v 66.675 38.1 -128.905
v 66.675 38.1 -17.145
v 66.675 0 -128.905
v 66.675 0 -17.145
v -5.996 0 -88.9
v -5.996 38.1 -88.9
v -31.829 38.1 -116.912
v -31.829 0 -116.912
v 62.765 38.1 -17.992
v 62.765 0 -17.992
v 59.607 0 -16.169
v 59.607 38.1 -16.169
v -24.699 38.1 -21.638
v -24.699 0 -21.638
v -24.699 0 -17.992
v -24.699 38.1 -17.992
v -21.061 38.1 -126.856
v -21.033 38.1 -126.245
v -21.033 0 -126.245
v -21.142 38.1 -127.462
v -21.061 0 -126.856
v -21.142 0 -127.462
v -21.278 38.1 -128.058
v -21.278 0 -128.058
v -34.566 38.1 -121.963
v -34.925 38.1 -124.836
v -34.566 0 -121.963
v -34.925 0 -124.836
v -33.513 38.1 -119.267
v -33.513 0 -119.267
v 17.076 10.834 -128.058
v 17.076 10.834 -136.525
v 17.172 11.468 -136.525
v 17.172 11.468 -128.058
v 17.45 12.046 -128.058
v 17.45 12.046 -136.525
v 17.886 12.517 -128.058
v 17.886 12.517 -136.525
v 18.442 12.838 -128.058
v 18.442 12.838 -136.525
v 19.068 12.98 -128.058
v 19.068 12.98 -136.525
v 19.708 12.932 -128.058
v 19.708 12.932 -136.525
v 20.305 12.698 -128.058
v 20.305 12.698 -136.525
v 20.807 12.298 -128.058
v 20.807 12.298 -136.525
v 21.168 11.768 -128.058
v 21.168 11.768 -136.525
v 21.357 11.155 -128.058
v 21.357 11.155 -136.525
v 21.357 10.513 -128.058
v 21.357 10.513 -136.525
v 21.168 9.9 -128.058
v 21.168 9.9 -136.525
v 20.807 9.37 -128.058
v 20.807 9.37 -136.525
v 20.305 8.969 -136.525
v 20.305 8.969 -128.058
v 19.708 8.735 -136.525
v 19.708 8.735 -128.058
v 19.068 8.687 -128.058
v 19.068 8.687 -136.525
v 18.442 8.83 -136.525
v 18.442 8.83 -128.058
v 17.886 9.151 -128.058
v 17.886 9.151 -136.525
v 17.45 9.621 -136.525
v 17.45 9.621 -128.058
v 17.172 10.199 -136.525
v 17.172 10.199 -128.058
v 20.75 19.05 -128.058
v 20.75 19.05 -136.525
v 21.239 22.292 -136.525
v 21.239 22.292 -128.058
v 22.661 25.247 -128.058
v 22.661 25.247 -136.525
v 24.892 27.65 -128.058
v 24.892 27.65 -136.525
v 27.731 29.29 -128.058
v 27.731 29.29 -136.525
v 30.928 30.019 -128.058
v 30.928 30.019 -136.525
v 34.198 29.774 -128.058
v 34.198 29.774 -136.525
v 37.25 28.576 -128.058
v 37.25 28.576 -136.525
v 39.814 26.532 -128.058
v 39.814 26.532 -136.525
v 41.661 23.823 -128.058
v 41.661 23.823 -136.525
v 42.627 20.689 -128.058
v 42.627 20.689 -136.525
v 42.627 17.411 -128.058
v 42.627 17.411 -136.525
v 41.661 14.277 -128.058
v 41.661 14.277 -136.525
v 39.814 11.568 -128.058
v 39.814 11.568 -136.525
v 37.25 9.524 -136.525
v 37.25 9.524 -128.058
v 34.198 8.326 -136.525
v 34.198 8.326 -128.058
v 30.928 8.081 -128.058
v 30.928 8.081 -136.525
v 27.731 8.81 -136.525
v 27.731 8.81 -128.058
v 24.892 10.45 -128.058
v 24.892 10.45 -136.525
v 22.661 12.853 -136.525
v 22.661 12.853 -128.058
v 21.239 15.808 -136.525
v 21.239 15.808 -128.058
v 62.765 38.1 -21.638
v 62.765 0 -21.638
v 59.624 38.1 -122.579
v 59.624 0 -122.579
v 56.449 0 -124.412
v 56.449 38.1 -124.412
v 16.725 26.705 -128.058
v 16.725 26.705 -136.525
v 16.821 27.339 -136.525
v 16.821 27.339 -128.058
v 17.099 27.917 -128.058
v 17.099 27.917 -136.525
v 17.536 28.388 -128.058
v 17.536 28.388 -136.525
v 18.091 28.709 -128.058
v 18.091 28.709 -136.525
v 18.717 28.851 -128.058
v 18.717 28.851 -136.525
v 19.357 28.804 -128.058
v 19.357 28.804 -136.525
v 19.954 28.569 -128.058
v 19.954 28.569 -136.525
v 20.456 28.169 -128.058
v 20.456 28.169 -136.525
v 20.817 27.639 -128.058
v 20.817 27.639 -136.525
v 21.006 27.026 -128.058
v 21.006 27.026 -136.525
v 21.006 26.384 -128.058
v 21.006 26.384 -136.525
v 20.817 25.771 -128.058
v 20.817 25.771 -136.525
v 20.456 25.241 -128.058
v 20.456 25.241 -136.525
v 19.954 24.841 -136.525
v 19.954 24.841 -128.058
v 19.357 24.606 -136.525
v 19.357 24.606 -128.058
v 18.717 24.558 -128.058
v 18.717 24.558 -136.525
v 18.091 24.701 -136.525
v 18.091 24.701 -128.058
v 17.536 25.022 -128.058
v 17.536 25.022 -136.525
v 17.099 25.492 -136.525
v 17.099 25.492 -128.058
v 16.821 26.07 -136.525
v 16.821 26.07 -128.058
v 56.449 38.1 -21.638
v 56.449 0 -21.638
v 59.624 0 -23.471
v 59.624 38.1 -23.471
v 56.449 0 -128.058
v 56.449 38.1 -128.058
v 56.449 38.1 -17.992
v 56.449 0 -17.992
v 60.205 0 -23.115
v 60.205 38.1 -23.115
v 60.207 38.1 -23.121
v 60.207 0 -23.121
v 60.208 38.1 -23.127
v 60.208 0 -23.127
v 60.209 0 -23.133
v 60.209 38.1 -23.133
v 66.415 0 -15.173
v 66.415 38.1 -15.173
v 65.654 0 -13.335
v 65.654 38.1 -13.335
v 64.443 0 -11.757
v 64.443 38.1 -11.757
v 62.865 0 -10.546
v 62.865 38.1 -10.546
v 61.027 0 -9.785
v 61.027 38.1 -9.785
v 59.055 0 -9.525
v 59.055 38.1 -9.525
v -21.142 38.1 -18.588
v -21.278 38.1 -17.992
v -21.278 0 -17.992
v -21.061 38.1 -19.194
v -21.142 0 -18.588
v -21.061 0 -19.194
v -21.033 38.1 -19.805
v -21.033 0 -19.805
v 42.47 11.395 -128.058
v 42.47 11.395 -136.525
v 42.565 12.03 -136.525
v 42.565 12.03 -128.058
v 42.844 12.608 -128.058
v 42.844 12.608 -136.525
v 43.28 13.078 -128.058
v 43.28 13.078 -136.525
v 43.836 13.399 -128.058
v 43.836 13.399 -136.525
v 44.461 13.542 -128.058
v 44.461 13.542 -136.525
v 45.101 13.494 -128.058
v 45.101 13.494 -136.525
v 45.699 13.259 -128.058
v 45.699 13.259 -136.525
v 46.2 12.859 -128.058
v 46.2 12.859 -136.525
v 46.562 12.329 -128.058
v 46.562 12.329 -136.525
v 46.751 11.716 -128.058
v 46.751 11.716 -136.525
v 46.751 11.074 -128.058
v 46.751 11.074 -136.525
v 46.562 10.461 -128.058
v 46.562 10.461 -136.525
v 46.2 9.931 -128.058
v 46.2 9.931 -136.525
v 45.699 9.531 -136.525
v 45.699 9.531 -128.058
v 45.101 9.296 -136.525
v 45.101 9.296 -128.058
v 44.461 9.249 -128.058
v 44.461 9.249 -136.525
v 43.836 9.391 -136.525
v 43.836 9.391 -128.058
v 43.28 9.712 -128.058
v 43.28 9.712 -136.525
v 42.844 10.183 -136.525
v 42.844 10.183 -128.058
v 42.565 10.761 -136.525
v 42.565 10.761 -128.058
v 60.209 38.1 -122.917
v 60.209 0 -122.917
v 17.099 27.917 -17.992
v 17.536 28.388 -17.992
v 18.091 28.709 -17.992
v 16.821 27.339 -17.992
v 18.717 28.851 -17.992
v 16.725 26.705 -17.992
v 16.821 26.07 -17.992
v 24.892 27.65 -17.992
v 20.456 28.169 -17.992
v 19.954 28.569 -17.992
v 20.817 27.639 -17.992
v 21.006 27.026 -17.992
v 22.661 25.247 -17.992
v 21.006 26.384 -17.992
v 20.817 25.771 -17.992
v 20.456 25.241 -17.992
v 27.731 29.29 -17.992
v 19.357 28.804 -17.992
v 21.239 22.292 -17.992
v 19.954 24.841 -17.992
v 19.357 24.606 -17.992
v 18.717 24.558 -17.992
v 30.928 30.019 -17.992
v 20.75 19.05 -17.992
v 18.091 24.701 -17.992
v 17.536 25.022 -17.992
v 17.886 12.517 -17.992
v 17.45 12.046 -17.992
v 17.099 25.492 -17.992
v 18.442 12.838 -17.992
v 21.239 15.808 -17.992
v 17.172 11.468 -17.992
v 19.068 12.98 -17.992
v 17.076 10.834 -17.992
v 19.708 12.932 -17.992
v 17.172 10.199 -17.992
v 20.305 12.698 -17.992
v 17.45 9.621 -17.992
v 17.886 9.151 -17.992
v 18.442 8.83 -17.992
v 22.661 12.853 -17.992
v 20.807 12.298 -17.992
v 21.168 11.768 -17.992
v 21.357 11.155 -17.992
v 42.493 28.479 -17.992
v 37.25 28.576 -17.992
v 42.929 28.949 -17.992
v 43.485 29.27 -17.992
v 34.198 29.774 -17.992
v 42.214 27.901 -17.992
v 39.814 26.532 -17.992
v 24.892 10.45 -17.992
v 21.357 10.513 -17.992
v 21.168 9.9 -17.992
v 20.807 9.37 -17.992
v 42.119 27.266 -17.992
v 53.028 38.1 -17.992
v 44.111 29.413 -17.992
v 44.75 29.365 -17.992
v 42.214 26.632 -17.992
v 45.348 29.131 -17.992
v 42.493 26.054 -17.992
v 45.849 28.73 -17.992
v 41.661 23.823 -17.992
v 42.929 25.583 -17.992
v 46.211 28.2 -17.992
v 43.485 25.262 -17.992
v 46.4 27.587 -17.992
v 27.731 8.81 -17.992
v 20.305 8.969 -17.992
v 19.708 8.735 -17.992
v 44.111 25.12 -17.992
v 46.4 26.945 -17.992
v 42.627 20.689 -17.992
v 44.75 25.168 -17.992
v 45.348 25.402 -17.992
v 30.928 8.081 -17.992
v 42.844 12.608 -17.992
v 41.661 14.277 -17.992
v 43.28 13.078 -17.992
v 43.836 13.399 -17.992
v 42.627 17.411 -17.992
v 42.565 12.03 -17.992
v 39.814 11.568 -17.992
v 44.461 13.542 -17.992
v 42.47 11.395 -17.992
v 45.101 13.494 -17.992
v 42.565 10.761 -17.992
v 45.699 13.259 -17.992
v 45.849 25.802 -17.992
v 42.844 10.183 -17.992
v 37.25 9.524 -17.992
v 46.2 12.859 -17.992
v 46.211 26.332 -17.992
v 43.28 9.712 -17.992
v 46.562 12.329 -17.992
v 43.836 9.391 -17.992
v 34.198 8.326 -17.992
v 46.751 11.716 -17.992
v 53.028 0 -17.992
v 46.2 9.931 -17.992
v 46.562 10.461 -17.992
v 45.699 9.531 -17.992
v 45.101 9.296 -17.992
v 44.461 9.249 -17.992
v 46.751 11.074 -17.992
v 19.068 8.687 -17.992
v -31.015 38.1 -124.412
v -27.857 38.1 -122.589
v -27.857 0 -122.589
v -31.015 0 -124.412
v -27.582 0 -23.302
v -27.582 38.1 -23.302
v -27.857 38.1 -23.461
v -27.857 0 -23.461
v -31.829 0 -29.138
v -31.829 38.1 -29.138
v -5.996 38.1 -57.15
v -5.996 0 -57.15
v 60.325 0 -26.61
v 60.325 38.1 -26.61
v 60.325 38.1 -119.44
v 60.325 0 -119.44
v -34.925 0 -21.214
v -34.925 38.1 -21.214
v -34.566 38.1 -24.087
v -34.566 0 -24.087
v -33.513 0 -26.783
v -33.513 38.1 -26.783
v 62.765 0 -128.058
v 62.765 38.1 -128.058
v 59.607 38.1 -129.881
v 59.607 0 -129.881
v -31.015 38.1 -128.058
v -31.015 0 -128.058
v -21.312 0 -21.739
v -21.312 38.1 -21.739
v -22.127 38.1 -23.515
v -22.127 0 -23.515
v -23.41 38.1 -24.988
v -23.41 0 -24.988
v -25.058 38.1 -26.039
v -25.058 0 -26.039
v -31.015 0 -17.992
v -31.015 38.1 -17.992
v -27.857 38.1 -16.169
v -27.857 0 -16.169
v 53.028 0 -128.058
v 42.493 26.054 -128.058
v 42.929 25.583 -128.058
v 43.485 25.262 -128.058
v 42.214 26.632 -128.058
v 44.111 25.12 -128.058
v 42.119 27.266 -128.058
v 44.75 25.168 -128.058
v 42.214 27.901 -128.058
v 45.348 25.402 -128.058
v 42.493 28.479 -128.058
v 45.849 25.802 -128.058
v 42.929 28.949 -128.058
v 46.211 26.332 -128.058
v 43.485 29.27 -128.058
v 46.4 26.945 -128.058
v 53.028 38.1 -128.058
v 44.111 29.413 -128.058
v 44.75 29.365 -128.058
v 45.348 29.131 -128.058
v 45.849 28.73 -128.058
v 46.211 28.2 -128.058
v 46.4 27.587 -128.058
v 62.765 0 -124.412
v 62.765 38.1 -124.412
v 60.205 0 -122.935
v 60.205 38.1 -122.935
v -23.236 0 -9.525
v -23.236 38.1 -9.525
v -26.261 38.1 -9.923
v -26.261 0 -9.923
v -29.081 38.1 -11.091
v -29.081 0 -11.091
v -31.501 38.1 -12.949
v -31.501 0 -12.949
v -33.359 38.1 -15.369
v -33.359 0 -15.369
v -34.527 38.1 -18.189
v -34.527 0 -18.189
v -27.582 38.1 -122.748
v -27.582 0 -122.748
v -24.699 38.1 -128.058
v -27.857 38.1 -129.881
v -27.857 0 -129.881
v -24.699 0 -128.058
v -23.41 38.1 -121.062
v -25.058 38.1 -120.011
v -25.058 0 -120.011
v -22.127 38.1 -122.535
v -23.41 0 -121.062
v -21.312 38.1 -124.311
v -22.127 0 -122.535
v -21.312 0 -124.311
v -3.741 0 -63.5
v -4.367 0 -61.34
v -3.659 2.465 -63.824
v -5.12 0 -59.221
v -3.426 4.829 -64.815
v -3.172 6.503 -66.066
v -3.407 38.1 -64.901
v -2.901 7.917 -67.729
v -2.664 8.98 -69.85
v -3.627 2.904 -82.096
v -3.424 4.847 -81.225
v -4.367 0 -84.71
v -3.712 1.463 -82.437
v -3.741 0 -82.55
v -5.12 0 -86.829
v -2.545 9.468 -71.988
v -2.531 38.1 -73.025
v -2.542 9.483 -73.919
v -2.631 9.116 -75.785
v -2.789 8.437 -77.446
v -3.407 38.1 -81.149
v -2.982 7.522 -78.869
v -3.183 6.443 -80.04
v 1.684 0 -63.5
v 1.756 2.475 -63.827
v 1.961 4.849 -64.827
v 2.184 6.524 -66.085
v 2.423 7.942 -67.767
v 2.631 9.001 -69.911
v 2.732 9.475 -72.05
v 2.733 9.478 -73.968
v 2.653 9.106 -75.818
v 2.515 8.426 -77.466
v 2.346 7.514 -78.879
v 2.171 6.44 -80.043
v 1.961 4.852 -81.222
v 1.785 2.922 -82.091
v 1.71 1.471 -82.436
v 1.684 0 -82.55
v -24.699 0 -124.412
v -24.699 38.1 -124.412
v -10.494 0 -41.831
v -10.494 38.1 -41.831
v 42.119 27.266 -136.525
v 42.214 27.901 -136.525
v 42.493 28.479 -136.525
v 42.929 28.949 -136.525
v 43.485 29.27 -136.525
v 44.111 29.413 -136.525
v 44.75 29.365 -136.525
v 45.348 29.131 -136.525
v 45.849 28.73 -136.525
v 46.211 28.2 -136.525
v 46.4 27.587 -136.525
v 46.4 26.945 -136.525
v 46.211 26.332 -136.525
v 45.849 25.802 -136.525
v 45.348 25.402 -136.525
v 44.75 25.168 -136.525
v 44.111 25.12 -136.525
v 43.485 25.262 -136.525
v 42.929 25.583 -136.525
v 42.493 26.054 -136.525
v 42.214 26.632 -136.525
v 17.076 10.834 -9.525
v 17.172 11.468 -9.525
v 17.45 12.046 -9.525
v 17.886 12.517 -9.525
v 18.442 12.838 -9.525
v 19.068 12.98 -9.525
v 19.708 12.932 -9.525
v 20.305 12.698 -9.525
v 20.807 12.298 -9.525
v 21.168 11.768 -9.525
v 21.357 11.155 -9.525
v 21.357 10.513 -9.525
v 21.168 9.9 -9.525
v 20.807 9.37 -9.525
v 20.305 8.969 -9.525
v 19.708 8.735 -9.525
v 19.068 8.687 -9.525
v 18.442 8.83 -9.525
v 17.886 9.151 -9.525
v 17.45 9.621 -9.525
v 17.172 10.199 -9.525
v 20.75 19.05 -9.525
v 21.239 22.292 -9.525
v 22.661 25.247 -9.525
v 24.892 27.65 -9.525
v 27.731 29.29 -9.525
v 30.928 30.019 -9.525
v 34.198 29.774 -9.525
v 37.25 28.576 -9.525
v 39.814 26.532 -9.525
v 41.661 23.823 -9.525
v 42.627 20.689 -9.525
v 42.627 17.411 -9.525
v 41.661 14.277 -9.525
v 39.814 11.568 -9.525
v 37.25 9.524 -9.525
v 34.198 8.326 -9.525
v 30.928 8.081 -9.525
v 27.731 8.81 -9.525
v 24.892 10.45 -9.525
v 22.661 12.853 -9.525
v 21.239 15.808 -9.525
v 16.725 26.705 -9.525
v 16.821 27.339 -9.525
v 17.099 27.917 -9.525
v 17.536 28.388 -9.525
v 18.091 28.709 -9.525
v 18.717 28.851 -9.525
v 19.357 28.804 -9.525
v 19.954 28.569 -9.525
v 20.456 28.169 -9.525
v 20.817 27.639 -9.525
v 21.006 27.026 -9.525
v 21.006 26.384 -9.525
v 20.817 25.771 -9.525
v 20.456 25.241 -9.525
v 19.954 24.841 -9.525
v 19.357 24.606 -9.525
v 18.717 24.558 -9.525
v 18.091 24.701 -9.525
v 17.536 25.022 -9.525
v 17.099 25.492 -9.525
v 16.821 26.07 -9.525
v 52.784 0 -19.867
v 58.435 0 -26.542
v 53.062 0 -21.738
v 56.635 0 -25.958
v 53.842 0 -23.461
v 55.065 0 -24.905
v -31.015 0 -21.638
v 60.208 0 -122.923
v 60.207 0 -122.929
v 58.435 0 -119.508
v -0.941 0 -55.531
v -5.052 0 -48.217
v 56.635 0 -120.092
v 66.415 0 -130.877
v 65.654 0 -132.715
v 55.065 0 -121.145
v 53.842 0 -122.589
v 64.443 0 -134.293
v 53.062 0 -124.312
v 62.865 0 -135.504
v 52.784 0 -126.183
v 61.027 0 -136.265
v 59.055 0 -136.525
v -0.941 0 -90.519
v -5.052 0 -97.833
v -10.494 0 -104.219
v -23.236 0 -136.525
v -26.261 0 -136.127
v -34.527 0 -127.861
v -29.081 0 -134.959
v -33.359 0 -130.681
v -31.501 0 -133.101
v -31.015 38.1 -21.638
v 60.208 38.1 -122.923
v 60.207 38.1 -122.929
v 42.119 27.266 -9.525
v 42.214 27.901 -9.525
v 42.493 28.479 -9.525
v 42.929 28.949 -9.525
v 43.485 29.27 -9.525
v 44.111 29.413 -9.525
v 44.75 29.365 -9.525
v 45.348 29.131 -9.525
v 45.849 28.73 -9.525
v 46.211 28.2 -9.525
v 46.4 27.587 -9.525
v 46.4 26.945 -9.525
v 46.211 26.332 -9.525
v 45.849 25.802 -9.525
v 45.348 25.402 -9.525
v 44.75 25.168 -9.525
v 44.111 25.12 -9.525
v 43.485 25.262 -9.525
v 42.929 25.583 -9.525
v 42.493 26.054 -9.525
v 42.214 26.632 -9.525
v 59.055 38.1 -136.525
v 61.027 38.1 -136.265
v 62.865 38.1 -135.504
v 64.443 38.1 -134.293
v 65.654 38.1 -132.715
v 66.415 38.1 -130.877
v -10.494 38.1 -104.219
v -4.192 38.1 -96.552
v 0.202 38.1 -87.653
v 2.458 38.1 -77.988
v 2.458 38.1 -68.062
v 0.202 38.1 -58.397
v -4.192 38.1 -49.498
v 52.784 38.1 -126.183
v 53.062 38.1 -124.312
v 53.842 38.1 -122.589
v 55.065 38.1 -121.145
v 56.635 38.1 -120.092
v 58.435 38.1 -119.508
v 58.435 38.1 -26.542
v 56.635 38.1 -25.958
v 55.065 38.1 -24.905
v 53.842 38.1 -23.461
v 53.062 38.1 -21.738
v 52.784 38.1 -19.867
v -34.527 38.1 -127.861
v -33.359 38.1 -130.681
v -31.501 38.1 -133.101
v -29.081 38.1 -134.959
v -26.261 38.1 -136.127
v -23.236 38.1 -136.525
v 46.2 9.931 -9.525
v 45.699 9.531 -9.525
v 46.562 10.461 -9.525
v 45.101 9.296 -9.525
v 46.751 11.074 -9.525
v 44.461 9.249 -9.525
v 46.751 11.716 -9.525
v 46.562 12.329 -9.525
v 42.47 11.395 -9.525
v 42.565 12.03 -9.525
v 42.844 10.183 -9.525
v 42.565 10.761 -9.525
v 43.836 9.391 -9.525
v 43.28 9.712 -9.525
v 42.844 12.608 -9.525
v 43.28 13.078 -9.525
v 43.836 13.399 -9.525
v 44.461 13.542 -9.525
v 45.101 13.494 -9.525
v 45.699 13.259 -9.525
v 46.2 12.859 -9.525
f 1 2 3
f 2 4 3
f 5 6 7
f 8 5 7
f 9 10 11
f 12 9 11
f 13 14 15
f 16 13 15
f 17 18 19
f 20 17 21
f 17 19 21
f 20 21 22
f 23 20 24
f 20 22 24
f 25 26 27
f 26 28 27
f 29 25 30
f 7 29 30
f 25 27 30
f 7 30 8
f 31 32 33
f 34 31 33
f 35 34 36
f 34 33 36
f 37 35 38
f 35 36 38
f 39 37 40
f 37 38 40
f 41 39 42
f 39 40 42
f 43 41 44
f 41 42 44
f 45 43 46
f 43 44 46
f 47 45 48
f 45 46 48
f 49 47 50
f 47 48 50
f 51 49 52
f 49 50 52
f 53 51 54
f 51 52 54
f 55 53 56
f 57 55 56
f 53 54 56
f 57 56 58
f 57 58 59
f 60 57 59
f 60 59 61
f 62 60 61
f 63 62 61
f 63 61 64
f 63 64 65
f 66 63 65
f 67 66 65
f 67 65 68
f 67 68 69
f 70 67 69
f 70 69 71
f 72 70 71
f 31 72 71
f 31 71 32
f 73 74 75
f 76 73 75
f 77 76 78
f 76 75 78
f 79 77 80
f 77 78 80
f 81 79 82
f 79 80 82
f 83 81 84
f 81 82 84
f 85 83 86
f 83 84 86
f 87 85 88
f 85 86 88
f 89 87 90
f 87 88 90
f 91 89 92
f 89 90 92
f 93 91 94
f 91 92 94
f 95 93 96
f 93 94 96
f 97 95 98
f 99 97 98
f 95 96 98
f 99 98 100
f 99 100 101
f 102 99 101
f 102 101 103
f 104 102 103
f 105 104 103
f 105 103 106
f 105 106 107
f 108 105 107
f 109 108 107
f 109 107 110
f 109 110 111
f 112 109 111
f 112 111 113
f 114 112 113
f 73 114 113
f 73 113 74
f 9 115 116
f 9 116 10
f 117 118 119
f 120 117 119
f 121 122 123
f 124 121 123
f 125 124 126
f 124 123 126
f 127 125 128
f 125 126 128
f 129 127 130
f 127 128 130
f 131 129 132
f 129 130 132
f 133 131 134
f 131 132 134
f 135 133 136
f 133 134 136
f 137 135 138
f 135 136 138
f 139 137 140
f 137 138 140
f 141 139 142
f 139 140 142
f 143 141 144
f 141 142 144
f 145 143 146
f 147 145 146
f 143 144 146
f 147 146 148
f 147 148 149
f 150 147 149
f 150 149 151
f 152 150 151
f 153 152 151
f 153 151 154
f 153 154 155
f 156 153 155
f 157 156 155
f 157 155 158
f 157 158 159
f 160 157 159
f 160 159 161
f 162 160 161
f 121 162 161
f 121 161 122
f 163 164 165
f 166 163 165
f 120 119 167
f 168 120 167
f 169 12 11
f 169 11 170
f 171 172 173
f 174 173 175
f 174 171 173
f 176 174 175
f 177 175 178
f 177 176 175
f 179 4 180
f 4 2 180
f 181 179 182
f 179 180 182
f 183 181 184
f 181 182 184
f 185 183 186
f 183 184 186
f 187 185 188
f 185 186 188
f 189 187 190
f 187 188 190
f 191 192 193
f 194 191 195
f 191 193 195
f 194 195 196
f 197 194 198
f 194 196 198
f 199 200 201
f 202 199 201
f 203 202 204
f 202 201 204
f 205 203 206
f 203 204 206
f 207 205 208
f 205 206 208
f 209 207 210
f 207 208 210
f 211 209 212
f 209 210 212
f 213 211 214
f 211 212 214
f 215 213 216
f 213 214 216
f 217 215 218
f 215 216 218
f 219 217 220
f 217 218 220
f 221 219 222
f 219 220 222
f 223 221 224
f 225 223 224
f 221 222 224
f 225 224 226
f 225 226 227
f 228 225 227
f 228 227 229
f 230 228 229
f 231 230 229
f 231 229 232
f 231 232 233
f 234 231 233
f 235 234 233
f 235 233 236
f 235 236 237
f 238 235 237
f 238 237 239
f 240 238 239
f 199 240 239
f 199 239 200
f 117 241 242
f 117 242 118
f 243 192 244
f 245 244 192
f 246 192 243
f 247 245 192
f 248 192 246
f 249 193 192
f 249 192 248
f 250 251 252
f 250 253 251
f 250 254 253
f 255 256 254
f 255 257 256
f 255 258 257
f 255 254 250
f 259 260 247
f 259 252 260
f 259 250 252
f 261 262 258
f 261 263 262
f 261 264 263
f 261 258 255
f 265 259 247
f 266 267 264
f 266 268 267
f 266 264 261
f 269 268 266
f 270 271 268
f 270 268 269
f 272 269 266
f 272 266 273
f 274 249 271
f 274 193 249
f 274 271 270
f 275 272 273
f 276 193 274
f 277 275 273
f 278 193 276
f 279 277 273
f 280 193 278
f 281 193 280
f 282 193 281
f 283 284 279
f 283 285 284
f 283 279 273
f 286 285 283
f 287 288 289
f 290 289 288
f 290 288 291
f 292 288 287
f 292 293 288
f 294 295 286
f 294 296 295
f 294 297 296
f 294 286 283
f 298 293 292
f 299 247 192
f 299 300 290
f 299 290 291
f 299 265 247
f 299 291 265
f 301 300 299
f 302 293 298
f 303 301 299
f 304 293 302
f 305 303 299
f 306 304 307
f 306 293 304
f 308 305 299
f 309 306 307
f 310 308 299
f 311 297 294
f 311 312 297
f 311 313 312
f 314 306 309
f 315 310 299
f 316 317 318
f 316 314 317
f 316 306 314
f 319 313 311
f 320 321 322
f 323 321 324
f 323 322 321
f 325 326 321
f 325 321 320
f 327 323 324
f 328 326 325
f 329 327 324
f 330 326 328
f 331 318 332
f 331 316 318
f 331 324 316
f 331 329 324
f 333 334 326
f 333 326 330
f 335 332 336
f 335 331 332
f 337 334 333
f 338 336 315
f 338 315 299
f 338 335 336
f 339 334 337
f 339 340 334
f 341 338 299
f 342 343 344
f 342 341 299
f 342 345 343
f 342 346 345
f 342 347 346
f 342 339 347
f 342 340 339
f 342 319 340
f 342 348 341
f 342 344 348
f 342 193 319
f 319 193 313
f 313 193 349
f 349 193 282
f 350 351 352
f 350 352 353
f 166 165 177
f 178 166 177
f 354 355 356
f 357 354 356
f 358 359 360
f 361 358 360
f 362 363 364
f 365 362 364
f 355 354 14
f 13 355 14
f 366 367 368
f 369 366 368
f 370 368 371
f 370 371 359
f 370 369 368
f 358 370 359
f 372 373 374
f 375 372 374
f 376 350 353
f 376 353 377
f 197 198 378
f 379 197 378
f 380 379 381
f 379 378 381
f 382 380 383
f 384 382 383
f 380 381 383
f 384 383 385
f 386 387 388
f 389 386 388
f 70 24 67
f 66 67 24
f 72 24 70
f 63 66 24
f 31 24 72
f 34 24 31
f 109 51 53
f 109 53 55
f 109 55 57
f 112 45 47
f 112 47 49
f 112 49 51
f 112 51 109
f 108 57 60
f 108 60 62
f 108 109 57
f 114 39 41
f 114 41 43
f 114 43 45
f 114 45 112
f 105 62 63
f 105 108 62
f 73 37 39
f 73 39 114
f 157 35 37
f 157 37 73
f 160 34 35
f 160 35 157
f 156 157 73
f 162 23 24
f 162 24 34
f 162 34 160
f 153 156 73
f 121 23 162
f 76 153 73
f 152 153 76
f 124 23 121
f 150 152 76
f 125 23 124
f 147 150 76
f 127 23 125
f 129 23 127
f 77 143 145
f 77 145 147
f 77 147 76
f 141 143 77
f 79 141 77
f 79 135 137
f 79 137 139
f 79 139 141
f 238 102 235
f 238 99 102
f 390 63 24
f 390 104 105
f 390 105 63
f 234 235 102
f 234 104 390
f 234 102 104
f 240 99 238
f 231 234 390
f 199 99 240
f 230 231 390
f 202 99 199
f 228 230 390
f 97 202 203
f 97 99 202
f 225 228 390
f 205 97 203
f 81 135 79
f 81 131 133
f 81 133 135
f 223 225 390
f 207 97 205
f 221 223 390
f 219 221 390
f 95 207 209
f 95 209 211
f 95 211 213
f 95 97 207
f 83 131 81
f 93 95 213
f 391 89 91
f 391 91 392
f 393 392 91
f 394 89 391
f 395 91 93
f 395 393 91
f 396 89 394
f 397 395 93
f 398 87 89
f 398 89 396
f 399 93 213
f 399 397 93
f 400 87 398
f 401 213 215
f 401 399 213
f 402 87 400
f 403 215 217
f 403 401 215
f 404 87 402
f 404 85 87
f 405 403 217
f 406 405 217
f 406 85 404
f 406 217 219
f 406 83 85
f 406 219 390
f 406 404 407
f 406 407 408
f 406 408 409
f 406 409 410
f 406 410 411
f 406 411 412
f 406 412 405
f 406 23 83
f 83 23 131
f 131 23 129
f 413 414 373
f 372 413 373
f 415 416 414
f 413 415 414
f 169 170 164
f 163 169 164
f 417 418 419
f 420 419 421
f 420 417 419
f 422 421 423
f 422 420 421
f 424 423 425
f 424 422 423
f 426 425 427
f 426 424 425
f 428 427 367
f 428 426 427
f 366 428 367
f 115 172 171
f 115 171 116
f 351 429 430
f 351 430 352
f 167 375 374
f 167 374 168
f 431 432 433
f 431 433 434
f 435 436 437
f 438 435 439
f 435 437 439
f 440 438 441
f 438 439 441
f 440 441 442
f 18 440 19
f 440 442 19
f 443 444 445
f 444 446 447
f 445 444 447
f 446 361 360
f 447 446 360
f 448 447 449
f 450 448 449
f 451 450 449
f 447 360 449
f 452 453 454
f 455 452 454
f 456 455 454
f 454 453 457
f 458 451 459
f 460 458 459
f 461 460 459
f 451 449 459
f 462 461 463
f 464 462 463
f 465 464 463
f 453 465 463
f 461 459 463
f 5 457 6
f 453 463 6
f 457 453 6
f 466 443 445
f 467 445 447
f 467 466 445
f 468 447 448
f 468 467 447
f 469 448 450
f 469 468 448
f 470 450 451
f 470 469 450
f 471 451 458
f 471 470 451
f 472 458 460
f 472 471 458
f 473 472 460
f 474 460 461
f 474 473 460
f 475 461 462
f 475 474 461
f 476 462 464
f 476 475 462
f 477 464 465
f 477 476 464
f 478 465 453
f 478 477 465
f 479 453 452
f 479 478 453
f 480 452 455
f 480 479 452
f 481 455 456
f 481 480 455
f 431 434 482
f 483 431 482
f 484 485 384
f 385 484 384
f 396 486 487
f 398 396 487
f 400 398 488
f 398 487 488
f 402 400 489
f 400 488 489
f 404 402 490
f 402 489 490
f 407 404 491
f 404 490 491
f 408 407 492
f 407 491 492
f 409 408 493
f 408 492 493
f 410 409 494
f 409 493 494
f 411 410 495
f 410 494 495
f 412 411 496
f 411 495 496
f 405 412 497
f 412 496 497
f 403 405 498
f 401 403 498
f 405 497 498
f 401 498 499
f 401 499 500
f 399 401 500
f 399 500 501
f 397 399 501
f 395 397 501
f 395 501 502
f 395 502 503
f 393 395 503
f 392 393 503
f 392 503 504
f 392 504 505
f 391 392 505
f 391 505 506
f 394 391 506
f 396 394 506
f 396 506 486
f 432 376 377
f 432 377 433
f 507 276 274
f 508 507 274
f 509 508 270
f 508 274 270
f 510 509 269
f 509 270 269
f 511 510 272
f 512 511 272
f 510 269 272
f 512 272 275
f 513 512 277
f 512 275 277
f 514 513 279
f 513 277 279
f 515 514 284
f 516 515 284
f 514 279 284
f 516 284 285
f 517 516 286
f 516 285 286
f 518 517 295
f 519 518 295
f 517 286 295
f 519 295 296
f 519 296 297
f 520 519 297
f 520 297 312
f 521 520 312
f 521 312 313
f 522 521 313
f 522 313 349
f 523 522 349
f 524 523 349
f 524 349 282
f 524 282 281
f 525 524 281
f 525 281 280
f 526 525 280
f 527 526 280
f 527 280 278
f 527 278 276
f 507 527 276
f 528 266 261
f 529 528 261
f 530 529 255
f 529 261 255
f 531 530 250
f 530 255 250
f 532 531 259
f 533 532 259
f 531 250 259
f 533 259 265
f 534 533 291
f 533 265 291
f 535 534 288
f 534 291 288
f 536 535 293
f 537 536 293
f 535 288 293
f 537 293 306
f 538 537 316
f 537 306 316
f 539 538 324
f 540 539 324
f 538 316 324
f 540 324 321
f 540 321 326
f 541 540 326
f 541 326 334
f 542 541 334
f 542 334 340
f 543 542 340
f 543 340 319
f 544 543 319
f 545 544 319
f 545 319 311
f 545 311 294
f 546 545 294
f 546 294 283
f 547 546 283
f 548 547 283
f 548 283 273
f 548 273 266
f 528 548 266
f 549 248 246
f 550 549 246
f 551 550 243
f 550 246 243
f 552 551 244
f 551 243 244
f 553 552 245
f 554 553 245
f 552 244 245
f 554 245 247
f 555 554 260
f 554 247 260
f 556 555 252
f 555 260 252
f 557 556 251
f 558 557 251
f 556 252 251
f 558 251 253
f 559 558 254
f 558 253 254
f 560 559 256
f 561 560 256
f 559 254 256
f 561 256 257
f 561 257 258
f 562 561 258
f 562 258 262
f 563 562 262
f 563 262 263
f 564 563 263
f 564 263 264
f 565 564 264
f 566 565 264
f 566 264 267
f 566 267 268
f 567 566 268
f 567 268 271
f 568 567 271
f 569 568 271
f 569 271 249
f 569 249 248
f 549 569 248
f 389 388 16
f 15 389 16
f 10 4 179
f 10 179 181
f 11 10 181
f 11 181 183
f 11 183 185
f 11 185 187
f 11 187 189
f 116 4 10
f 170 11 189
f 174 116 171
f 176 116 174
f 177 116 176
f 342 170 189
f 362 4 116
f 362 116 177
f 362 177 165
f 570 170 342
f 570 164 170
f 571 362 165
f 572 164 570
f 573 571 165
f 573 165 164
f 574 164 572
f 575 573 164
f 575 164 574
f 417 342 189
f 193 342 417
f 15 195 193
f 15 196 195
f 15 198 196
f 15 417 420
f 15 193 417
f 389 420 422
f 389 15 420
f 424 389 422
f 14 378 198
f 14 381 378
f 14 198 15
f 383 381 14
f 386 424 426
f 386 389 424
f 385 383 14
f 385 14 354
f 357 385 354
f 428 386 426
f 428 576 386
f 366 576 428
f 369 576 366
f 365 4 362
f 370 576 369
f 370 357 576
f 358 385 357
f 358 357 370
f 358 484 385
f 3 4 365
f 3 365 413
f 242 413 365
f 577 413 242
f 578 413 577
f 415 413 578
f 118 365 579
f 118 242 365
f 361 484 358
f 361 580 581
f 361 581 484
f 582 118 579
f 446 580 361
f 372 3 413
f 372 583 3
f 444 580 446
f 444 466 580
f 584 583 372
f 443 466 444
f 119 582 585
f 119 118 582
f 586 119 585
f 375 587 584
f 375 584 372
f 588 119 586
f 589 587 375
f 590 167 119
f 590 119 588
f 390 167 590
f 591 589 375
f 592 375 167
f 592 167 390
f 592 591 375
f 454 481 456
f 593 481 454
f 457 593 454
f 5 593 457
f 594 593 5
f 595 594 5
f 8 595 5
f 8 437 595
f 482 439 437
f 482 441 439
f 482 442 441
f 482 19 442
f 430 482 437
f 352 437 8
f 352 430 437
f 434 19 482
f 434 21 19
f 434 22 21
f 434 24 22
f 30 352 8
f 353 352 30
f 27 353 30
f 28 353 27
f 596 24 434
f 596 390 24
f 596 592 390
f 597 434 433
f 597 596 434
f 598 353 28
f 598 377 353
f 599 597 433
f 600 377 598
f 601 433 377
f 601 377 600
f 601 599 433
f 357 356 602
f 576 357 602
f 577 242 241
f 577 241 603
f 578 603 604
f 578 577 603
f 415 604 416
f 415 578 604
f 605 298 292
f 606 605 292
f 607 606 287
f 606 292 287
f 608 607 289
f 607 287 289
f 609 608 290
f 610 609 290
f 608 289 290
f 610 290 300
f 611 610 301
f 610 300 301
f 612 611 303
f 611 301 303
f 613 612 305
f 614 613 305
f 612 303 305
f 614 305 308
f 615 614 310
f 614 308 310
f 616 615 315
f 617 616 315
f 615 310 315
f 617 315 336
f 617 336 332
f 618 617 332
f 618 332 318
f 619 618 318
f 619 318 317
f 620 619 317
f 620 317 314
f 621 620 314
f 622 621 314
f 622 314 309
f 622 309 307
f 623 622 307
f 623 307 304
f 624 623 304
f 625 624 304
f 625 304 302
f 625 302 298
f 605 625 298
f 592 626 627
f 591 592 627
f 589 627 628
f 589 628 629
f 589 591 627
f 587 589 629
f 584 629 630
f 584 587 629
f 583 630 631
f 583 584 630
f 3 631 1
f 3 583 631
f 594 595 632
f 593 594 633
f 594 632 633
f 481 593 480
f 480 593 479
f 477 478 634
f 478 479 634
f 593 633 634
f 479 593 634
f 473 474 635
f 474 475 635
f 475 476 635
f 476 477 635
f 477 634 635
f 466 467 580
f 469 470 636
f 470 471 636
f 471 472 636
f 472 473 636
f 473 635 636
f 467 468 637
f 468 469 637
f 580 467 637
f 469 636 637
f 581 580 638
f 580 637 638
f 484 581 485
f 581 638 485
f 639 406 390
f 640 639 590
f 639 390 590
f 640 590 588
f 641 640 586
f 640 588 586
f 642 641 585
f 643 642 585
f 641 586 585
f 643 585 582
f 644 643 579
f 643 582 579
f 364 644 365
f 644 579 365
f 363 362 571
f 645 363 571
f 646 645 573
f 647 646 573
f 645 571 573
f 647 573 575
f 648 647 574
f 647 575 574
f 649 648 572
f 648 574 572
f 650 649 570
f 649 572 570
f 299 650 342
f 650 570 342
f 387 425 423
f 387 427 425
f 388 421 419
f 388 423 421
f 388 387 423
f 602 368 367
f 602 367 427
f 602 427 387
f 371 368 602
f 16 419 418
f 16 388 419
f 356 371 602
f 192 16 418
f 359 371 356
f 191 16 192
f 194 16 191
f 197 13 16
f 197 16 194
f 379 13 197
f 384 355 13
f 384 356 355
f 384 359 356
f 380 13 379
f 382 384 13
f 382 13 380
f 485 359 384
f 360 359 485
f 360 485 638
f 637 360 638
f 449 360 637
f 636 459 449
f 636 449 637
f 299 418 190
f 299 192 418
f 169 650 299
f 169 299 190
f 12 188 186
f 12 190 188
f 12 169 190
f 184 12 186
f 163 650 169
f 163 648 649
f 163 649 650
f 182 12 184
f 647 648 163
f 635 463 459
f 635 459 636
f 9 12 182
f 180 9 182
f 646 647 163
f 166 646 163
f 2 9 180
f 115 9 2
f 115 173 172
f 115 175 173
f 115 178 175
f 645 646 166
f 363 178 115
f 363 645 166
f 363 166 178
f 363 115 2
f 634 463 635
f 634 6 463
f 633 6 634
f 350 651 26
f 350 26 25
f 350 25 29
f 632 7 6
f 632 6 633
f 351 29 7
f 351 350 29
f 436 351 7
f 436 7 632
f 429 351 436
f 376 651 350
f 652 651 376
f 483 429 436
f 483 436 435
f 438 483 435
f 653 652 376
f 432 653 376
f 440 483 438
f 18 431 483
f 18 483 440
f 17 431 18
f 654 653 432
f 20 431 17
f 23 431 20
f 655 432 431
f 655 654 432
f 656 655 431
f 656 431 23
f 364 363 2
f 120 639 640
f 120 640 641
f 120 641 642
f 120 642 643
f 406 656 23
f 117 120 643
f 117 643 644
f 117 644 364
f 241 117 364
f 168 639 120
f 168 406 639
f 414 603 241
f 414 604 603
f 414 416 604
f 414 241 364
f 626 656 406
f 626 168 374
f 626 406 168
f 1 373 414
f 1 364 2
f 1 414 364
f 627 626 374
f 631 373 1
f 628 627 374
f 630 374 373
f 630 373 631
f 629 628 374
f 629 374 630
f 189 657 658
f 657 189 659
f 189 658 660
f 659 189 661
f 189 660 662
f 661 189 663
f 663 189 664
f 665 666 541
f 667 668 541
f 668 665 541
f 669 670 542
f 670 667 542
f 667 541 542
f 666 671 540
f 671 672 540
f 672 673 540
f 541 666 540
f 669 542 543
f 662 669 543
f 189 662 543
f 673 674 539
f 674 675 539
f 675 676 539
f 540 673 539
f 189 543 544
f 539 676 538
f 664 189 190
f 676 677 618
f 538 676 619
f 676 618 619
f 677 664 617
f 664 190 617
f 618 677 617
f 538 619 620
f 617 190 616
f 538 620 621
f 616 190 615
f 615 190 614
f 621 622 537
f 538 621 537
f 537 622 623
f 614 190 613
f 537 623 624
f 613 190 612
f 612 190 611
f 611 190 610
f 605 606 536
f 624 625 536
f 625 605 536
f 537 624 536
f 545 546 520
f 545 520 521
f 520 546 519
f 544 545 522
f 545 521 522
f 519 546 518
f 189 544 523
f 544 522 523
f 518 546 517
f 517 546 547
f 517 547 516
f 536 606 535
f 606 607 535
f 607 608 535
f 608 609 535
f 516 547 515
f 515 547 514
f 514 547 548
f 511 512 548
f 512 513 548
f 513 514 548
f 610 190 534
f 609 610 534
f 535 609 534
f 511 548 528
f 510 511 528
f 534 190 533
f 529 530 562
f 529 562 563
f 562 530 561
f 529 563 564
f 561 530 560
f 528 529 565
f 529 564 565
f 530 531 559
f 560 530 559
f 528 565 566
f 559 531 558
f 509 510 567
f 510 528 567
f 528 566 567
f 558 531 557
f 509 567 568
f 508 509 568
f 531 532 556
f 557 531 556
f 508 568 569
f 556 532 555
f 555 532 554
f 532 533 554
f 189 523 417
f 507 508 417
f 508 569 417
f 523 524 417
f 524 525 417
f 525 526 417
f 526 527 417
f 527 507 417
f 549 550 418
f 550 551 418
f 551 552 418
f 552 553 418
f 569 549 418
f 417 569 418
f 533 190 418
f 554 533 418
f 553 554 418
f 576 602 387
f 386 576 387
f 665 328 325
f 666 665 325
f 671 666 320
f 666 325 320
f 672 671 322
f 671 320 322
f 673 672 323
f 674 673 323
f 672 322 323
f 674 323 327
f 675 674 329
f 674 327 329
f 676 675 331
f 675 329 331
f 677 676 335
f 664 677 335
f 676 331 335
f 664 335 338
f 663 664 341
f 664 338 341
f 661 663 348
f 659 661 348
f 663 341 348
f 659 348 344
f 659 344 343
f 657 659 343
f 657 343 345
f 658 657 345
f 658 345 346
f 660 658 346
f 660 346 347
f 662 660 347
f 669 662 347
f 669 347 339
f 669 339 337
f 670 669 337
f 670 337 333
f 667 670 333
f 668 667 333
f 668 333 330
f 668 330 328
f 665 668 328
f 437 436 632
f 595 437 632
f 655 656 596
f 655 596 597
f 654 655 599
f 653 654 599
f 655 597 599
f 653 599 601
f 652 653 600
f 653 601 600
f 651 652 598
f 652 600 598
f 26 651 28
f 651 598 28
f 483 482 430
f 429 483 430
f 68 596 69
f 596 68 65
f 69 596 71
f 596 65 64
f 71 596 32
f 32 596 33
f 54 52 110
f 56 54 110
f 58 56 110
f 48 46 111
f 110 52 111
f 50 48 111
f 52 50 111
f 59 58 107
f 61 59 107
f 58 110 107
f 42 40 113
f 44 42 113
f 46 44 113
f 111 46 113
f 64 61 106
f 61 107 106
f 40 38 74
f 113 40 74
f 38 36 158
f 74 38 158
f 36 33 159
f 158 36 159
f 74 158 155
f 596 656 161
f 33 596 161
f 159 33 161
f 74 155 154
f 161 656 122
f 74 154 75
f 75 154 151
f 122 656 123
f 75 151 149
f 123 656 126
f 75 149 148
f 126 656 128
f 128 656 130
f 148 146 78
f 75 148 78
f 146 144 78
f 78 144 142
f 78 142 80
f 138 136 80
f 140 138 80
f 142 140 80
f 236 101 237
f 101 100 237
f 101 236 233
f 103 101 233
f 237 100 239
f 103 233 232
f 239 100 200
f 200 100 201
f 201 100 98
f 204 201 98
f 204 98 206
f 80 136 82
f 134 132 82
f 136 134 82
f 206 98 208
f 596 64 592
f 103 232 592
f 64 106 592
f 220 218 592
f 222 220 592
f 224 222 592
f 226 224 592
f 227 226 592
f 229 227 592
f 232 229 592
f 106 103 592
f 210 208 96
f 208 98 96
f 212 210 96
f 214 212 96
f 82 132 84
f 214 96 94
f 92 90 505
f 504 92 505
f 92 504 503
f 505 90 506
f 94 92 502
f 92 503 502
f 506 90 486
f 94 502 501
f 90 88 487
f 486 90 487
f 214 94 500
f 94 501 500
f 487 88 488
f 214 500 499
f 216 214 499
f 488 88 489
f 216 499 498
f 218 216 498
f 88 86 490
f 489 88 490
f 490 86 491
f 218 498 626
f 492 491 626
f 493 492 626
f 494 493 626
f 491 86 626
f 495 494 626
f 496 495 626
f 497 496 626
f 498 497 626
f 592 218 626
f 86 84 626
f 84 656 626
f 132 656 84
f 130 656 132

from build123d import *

# Parameters (mm, degrees)
SKETCH1_W               = 95.25
SKETCH1_H               = 8.466666667
BOSS_EXTRUDE1_DEPTH     = 38.1
SKETCH2_W               = 6.35
SKETCH2_H               = 127
BOSS_EXTRUDE2_DEPTH     = 38.1
SKETCH3_W               = 88.9
SKETCH3_H               = 8.466666667
BOSS_EXTRUDE3_DEPTH     = 38.1
SKETCH4_R               = 11
CUT_EXTRUDE1_DEPTH      = 149.412147835
SKETCH5_R               = 2.15265
CUT_EXTRUDE2_DEPTH      = 149.412147835
FILLET1_R               = 7.62
BOSS_EXTRUDE4_DEPTH     = 38.1
CUT_EXTRUDE8_REACH      = 172.773
CUT_EXTRUDE8_END_RADIUS = 38.1
FILLET2_R               = 11.688947
FILLET3_R               = 11.688947
FILLET4_R               = 6.35
BOSS_EXTRUDE7_START     = -38.1
BOSS_EXTRUDE7_DEPTH     = 38.1
CUT_EXTRUDE12_DEPTH     = 157.640484095


with BuildPart() as part:
    # Sketch1 → Boss-Extrude1 (new body)
    with BuildSketch(Plane(origin=(0, 0, 0), x_dir=(1, 0, 0), z_dir=(0, 1, 0))):
        with Locations((19.05, 13.758333334)):
            Rectangle(SKETCH1_W, SKETCH1_H)
    extrude(amount=BOSS_EXTRUDE1_DEPTH)

    # Sketch2 → Boss-Extrude2 (add)
    with BuildSketch(Plane(origin=(0, 38.1, 0), x_dir=(1, 0, 0), z_dir=(0, 1, 0))):
        with Locations((63.5, 73.025)):
            Rectangle(SKETCH2_W, SKETCH2_H)
    extrude(amount=-BOSS_EXTRUDE2_DEPTH)

    # Sketch3 → Boss-Extrude3 (add)
    with BuildSketch(Plane(origin=(0, 38.1, 0), x_dir=(1, 0, 0), z_dir=(0, 1, 0))):
        with Locations((15.875, 132.291666667)):
            Rectangle(SKETCH3_W, SKETCH3_H)
    extrude(amount=-BOSS_EXTRUDE3_DEPTH)

    # Sketch4 → Cut-Extrude1 (cut, through all)
    with BuildSketch(Plane(origin=(0, 0, -136.525), x_dir=(-1, 0, 0), z_dir=(0, 0, -1))):
        with Locations((-31.75, 19.05)):
            Circle(SKETCH4_R)
    extrude(amount=-CUT_EXTRUDE1_DEPTH, mode=Mode.SUBTRACT)

    # Sketch5 → Cut-Extrude2 (cut, through all)
    with BuildSketch(Plane(origin=(0, 0, -136.525), x_dir=(-1, 0, 0), z_dir=(0, 0, -1))):
        with Locations((-18.877667779, 26.704865736)):
            Circle(SKETCH5_R)
        with Locations((-19.228536904, 10.833743663)):
            Circle(SKETCH5_R)
        with Locations((-44.622332221, 11.395134264)):
            Circle(SKETCH5_R)
        with Locations((-44.271463096, 27.266256337)):
            Circle(SKETCH5_R)
    extrude(amount=-CUT_EXTRUDE2_DEPTH, mode=Mode.SUBTRACT)

    # Fillet1
    fillet1_edges = [part.edges().sort_by_distance(p)[0] for p in [
        (66.675, 19.05, -136.525),
        (66.675, 19.05, -9.525),
    ]]
    fillet(fillet1_edges, radius=FILLET1_R)

    # Sketch10 → Boss-Extrude4 (add)
    with BuildSketch(Plane(origin=(0, 38.1, 0), x_dir=(1, 0, 0), z_dir=(0, 1, 0))):
        with BuildLine():
            Line((-28.575, 17.991666667), (-28.575, 9.525))
            Line((-28.575, 9.525), (-34.925, 9.525))
            Line((-34.925, 9.525), (-34.925, 25.781))
            Line((-34.925, 25.781), (-5.996027965, 57.15))
            ThreePointArc((-5.996027965, 57.15), (-2.531188929, 73.025), (-5.996027965, 88.9))
            Line((-5.996027965, 88.9), (-34.925, 120.269))
            Line((-34.925, 120.269), (-34.925, 136.525))
            Line((-34.925, 136.525), (-28.575, 136.525))
            Line((-28.575, 136.525), (-28.575, 123.825))
            Line((-28.575, 123.825), (-10.494392478, 104.219375))
            ThreePointArc((-10.494392478, 104.219375), (2.742945437, 73.025), (-10.494392478, 41.830625))
            Line((-10.494392478, 41.830625), (-28.575, 22.225))
            Line((-28.575, 22.225), (-28.575, 17.991666667))
        make_face()
    extrude(amount=-BOSS_EXTRUDE4_DEPTH)

    # Cut-Extrude8: up to this cylinder (the profile starts outside it)
    cut_extrude8_end = Plane(origin=(-40.631188929, 4.042536, -73.025), z_dir=(0, 1, 0)) * Cylinder(CUT_EXTRUDE8_END_RADIUS, 422.746, mode=Mode.PRIVATE)
    # Sketch12 → Cut-Extrude8 (cut, up to the surface)
    with BuildSketch(Plane.ZY.offset(-60.325), mode=Mode.PRIVATE) as cut_extrude8_sk1:
        with BuildLine():
            Line((-82.55, 0), (-63.5, 0))
            ThreePointArc((-63.5, 0), (-73.025, 9.525), (-82.55, 0))
        make_face()
    cut_extrude8_tool1 = extrude(cut_extrude8_sk1.sketch, amount=CUT_EXTRUDE8_REACH, mode=Mode.PRIVATE) - cut_extrude8_end
    add(cut_extrude8_tool1.solids().sort_by_distance((60.325, 4.042536, -73.025))[0], mode=Mode.SUBTRACT)

    # Fillet2
    fillet2_edges = [part.edges().sort_by_distance(p)[0] for p in [
        (-34.925, 19.05, -136.525),
        (-34.925, 19.05, -120.269),
    ]]
    fillet(fillet2_edges, radius=FILLET2_R - 0.0001)  # a hair under: the kernel refuses the full size

    # Fillet3
    fillet3_edges = [part.edges().sort_by_distance(p)[0] for p in [
        (-34.925, 19.05, -25.781),
        (-34.925, 19.05, -9.525),
    ]]
    fillet(fillet3_edges, radius=FILLET3_R - 0.0001)  # a hair under: the kernel refuses the full size

    # Fillet4
    fillet4_edges = [part.edges().sort_by_distance(p)[0] for p in [
        (60.325, 19.05, -17.991666667),
        (60.325, 19.05, -128.058333333),
    ]]
    fillet(fillet4_edges, radius=FILLET4_R)

    # Sketch15 → Boss-Extrude7 (add)
    with BuildSketch(Plane(origin=(0, 38.1, 0), x_dir=(1, 0, 0), z_dir=(0, 1, 0)).offset(BOSS_EXTRUDE7_START)):
        with BuildLine():
            Line((-27.874453006, 23.470813729), (-27.581873113, 23.301892649))
            Line((-27.581873113, 23.301892649), (-25.057662874, 26.039008606))
            ThreePointArc((-25.057662874, 26.039008606), (-34.066608211, 16.896224406), (-21.277878592, 17.991666667))
            Line((-21.277878592, 17.991666667), (-24.699453006, 17.991666667))
            Line((-24.699453006, 17.991666667), (-24.699453006, 17.971552415))
            Line((-24.699453006, 17.971552415), (-27.874453006, 16.13846531))
            Line((-27.874453006, 16.13846531), (-31.049453006, 17.971552415))
            Line((-31.049453006, 17.971552415), (-31.049453006, 21.637726624))
            Line((-31.049453006, 21.637726624), (-27.874453006, 23.470813729))
        make_face()
        with BuildLine():
            Line((-27.581873113, 23.301892649), (-24.699453006, 21.637726624))
            Line((-24.699453006, 21.637726624), (-24.699453006, 17.991666667))
            Line((-24.699453006, 17.991666667), (-21.277878592, 17.991666667))
            ThreePointArc((-21.277878592, 17.991666667), (-21.094704511, 18.889940166), (-21.033278796, 19.804639519))
            ThreePointArc((-21.033278796, 19.804639519), (-22.126765794, 23.514862731), (-25.057662874, 26.039008606))
            Line((-25.057662874, 26.039008606), (-27.581873113, 23.301892649))
        make_face()
        with BuildLine():
            ThreePointArc((60.325, 26.609850645), (54.403432166, 24.225341495), (53.027878592, 17.991666667))
            Line((53.027878592, 17.991666667), (53.975, 17.991666667))
            ThreePointArc((53.975, 17.991666667), (55.237426297, 18.118421545), (56.449453006, 18.493625771))
            Line((56.449453006, 18.493625771), (56.449453006, 21.637726624))
            Line((56.449453006, 21.637726624), (59.624453006, 23.470813729))
            Line((59.624453006, 23.470813729), (60.208975135, 23.13333972))
            ThreePointArc((60.208975135, 23.13333972), (60.295927231, 23.734724375), (60.325, 24.341666667))
            Line((60.325, 24.341666667), (60.325, 26.609850645))
        make_face()
        with BuildLine():
            Line((53.975, 17.991666667), (53.027878592, 17.991666667))
            ThreePointArc((53.027878592, 17.991666667), (60.539152358, 13.024891024), (66.465627215, 19.804639519))
            ThreePointArc((66.465627215, 19.804639519), (64.703538976, 24.387711662), (60.325, 26.609850645))
            Line((60.325, 26.609850645), (60.325, 24.341666667))
            ThreePointArc((60.325, 24.341666667), (60.295927231, 23.734724375), (60.208975135, 23.13333972))
            Line((60.208975135, 23.13333972), (62.799453006, 21.637726624))
            Line((62.799453006, 21.637726624), (62.799453006, 17.971552415))
            Line((62.799453006, 17.971552415), (59.624453006, 16.13846531))
            Line((59.624453006, 16.13846531), (56.449453006, 17.971552415))
            Line((56.449453006, 17.971552415), (56.449453006, 18.493625771))
            ThreePointArc((56.449453006, 18.493625771), (55.237426297, 18.118421545), (53.975, 17.991666667))
        make_face()
        with BuildLine():
            Line((60.325, 121.708333333), (60.325, 119.440149355))
            ThreePointArc((60.325, 119.440149355), (64.703538976, 121.662288338), (66.465627215, 126.245360481))
            ThreePointArc((66.465627215, 126.245360481), (60.539152358, 133.025108976), (53.027878592, 128.058333333))
            Line((53.027878592, 128.058333333), (53.975, 128.058333333))
            ThreePointArc((53.975, 128.058333333), (55.237426297, 127.931578455), (56.449453006, 127.556374229))
            Line((56.449453006, 127.556374229), (56.449453006, 128.078447585))
            Line((56.449453006, 128.078447585), (59.624453006, 129.91153469))
            Line((59.624453006, 129.91153469), (62.799453006, 128.078447585))
            Line((62.799453006, 128.078447585), (62.799453006, 124.412273376))
            Line((62.799453006, 124.412273376), (60.208975135, 122.91666028))
            ThreePointArc((60.208975135, 122.91666028), (60.295927231, 122.315275625), (60.325, 121.708333333))
        make_face()
        with BuildLine():
            ThreePointArc((53.027878592, 128.058333333), (54.403432166, 121.824658505), (60.325, 119.440149355))
            Line((60.325, 119.440149355), (60.325, 121.708333333))
            ThreePointArc((60.325, 121.708333333), (60.295927231, 122.315275625), (60.208975135, 122.91666028))
            Line((60.208975135, 122.91666028), (59.624453006, 122.579186271))
            Line((59.624453006, 122.579186271), (56.449453006, 124.412273376))
            Line((56.449453006, 124.412273376), (56.449453006, 127.556374229))
            ThreePointArc((56.449453006, 127.556374229), (55.237426297, 127.931578455), (53.975, 128.058333333))
            Line((53.975, 128.058333333), (53.027878592, 128.058333333))
        make_face()
        with BuildLine():
            Line((-24.699453006, 128.058333333), (-21.277878592, 128.058333333))
            ThreePointArc((-21.277878592, 128.058333333), (-34.066608211, 129.153775594), (-25.057662874, 120.010991394))
            Line((-25.057662874, 120.010991394), (-27.581873113, 122.748107351))
            Line((-27.581873113, 122.748107351), (-27.874453006, 122.579186271))
            Line((-27.874453006, 122.579186271), (-31.049453006, 124.412273376))
            Line((-31.049453006, 124.412273376), (-31.049453006, 128.078447585))
            Line((-31.049453006, 128.078447585), (-27.874453006, 129.91153469))
            Line((-27.874453006, 129.91153469), (-24.699453006, 128.078447585))
            Line((-24.699453006, 128.078447585), (-24.699453006, 128.058333333))
        make_face()
        with BuildLine():
            ThreePointArc((-21.033278796, 126.245360481), (-21.094704511, 127.160059834), (-21.277878592, 128.058333333))
            Line((-21.277878592, 128.058333333), (-24.699453006, 128.058333333))
            Line((-24.699453006, 128.058333333), (-24.699453006, 124.412273376))
            Line((-24.699453006, 124.412273376), (-27.581873113, 122.748107351))
            Line((-27.581873113, 122.748107351), (-25.057662874, 120.010991394))
            ThreePointArc((-25.057662874, 120.010991394), (-22.126765794, 122.535137269), (-21.033278796, 126.245360481))
        make_face()
    extrude(amount=BOSS_EXTRUDE7_DEPTH)

    # Sketch21 → Cut-Extrude12 (cut, through all)
    with BuildSketch(Plane(origin=(0, 38.1, 0), x_dir=(1, 0, 0), z_dir=(0, 1, 0))):
        Polygon((-24.699453006, 21.637726624), (-27.857033552, 23.460756602), (-31.014614099, 21.637726624), (-31.014614099, 17.991666667), (-27.857033552, 16.168636688), (-24.699453006, 17.991666667), align=None)
        Polygon((56.449453006, 17.991666667), (56.449453006, 21.637726624), (59.607033552, 23.460756602), (62.764614099, 21.637726624), (62.764614099, 17.991666667), (59.607033552, 16.168636688), align=None)
        Polygon((59.607033552, 129.881363312), (56.449453006, 128.058333333), (56.449453006, 124.412273376), (59.607033552, 122.589243398), (62.764614099, 124.412273376), (62.764614099, 128.058333333), align=None)
        Polygon((-24.699453006, 128.058333333), (-24.699453006, 124.412273376), (-27.857033552, 122.589243398), (-31.014614099, 124.412273376), (-31.014614099, 128.058333333), (-27.857033552, 129.881363312), align=None)
    extrude(amount=-CUT_EXTRUDE12_DEPTH, mode=Mode.SUBTRACT)


solid = part.part
